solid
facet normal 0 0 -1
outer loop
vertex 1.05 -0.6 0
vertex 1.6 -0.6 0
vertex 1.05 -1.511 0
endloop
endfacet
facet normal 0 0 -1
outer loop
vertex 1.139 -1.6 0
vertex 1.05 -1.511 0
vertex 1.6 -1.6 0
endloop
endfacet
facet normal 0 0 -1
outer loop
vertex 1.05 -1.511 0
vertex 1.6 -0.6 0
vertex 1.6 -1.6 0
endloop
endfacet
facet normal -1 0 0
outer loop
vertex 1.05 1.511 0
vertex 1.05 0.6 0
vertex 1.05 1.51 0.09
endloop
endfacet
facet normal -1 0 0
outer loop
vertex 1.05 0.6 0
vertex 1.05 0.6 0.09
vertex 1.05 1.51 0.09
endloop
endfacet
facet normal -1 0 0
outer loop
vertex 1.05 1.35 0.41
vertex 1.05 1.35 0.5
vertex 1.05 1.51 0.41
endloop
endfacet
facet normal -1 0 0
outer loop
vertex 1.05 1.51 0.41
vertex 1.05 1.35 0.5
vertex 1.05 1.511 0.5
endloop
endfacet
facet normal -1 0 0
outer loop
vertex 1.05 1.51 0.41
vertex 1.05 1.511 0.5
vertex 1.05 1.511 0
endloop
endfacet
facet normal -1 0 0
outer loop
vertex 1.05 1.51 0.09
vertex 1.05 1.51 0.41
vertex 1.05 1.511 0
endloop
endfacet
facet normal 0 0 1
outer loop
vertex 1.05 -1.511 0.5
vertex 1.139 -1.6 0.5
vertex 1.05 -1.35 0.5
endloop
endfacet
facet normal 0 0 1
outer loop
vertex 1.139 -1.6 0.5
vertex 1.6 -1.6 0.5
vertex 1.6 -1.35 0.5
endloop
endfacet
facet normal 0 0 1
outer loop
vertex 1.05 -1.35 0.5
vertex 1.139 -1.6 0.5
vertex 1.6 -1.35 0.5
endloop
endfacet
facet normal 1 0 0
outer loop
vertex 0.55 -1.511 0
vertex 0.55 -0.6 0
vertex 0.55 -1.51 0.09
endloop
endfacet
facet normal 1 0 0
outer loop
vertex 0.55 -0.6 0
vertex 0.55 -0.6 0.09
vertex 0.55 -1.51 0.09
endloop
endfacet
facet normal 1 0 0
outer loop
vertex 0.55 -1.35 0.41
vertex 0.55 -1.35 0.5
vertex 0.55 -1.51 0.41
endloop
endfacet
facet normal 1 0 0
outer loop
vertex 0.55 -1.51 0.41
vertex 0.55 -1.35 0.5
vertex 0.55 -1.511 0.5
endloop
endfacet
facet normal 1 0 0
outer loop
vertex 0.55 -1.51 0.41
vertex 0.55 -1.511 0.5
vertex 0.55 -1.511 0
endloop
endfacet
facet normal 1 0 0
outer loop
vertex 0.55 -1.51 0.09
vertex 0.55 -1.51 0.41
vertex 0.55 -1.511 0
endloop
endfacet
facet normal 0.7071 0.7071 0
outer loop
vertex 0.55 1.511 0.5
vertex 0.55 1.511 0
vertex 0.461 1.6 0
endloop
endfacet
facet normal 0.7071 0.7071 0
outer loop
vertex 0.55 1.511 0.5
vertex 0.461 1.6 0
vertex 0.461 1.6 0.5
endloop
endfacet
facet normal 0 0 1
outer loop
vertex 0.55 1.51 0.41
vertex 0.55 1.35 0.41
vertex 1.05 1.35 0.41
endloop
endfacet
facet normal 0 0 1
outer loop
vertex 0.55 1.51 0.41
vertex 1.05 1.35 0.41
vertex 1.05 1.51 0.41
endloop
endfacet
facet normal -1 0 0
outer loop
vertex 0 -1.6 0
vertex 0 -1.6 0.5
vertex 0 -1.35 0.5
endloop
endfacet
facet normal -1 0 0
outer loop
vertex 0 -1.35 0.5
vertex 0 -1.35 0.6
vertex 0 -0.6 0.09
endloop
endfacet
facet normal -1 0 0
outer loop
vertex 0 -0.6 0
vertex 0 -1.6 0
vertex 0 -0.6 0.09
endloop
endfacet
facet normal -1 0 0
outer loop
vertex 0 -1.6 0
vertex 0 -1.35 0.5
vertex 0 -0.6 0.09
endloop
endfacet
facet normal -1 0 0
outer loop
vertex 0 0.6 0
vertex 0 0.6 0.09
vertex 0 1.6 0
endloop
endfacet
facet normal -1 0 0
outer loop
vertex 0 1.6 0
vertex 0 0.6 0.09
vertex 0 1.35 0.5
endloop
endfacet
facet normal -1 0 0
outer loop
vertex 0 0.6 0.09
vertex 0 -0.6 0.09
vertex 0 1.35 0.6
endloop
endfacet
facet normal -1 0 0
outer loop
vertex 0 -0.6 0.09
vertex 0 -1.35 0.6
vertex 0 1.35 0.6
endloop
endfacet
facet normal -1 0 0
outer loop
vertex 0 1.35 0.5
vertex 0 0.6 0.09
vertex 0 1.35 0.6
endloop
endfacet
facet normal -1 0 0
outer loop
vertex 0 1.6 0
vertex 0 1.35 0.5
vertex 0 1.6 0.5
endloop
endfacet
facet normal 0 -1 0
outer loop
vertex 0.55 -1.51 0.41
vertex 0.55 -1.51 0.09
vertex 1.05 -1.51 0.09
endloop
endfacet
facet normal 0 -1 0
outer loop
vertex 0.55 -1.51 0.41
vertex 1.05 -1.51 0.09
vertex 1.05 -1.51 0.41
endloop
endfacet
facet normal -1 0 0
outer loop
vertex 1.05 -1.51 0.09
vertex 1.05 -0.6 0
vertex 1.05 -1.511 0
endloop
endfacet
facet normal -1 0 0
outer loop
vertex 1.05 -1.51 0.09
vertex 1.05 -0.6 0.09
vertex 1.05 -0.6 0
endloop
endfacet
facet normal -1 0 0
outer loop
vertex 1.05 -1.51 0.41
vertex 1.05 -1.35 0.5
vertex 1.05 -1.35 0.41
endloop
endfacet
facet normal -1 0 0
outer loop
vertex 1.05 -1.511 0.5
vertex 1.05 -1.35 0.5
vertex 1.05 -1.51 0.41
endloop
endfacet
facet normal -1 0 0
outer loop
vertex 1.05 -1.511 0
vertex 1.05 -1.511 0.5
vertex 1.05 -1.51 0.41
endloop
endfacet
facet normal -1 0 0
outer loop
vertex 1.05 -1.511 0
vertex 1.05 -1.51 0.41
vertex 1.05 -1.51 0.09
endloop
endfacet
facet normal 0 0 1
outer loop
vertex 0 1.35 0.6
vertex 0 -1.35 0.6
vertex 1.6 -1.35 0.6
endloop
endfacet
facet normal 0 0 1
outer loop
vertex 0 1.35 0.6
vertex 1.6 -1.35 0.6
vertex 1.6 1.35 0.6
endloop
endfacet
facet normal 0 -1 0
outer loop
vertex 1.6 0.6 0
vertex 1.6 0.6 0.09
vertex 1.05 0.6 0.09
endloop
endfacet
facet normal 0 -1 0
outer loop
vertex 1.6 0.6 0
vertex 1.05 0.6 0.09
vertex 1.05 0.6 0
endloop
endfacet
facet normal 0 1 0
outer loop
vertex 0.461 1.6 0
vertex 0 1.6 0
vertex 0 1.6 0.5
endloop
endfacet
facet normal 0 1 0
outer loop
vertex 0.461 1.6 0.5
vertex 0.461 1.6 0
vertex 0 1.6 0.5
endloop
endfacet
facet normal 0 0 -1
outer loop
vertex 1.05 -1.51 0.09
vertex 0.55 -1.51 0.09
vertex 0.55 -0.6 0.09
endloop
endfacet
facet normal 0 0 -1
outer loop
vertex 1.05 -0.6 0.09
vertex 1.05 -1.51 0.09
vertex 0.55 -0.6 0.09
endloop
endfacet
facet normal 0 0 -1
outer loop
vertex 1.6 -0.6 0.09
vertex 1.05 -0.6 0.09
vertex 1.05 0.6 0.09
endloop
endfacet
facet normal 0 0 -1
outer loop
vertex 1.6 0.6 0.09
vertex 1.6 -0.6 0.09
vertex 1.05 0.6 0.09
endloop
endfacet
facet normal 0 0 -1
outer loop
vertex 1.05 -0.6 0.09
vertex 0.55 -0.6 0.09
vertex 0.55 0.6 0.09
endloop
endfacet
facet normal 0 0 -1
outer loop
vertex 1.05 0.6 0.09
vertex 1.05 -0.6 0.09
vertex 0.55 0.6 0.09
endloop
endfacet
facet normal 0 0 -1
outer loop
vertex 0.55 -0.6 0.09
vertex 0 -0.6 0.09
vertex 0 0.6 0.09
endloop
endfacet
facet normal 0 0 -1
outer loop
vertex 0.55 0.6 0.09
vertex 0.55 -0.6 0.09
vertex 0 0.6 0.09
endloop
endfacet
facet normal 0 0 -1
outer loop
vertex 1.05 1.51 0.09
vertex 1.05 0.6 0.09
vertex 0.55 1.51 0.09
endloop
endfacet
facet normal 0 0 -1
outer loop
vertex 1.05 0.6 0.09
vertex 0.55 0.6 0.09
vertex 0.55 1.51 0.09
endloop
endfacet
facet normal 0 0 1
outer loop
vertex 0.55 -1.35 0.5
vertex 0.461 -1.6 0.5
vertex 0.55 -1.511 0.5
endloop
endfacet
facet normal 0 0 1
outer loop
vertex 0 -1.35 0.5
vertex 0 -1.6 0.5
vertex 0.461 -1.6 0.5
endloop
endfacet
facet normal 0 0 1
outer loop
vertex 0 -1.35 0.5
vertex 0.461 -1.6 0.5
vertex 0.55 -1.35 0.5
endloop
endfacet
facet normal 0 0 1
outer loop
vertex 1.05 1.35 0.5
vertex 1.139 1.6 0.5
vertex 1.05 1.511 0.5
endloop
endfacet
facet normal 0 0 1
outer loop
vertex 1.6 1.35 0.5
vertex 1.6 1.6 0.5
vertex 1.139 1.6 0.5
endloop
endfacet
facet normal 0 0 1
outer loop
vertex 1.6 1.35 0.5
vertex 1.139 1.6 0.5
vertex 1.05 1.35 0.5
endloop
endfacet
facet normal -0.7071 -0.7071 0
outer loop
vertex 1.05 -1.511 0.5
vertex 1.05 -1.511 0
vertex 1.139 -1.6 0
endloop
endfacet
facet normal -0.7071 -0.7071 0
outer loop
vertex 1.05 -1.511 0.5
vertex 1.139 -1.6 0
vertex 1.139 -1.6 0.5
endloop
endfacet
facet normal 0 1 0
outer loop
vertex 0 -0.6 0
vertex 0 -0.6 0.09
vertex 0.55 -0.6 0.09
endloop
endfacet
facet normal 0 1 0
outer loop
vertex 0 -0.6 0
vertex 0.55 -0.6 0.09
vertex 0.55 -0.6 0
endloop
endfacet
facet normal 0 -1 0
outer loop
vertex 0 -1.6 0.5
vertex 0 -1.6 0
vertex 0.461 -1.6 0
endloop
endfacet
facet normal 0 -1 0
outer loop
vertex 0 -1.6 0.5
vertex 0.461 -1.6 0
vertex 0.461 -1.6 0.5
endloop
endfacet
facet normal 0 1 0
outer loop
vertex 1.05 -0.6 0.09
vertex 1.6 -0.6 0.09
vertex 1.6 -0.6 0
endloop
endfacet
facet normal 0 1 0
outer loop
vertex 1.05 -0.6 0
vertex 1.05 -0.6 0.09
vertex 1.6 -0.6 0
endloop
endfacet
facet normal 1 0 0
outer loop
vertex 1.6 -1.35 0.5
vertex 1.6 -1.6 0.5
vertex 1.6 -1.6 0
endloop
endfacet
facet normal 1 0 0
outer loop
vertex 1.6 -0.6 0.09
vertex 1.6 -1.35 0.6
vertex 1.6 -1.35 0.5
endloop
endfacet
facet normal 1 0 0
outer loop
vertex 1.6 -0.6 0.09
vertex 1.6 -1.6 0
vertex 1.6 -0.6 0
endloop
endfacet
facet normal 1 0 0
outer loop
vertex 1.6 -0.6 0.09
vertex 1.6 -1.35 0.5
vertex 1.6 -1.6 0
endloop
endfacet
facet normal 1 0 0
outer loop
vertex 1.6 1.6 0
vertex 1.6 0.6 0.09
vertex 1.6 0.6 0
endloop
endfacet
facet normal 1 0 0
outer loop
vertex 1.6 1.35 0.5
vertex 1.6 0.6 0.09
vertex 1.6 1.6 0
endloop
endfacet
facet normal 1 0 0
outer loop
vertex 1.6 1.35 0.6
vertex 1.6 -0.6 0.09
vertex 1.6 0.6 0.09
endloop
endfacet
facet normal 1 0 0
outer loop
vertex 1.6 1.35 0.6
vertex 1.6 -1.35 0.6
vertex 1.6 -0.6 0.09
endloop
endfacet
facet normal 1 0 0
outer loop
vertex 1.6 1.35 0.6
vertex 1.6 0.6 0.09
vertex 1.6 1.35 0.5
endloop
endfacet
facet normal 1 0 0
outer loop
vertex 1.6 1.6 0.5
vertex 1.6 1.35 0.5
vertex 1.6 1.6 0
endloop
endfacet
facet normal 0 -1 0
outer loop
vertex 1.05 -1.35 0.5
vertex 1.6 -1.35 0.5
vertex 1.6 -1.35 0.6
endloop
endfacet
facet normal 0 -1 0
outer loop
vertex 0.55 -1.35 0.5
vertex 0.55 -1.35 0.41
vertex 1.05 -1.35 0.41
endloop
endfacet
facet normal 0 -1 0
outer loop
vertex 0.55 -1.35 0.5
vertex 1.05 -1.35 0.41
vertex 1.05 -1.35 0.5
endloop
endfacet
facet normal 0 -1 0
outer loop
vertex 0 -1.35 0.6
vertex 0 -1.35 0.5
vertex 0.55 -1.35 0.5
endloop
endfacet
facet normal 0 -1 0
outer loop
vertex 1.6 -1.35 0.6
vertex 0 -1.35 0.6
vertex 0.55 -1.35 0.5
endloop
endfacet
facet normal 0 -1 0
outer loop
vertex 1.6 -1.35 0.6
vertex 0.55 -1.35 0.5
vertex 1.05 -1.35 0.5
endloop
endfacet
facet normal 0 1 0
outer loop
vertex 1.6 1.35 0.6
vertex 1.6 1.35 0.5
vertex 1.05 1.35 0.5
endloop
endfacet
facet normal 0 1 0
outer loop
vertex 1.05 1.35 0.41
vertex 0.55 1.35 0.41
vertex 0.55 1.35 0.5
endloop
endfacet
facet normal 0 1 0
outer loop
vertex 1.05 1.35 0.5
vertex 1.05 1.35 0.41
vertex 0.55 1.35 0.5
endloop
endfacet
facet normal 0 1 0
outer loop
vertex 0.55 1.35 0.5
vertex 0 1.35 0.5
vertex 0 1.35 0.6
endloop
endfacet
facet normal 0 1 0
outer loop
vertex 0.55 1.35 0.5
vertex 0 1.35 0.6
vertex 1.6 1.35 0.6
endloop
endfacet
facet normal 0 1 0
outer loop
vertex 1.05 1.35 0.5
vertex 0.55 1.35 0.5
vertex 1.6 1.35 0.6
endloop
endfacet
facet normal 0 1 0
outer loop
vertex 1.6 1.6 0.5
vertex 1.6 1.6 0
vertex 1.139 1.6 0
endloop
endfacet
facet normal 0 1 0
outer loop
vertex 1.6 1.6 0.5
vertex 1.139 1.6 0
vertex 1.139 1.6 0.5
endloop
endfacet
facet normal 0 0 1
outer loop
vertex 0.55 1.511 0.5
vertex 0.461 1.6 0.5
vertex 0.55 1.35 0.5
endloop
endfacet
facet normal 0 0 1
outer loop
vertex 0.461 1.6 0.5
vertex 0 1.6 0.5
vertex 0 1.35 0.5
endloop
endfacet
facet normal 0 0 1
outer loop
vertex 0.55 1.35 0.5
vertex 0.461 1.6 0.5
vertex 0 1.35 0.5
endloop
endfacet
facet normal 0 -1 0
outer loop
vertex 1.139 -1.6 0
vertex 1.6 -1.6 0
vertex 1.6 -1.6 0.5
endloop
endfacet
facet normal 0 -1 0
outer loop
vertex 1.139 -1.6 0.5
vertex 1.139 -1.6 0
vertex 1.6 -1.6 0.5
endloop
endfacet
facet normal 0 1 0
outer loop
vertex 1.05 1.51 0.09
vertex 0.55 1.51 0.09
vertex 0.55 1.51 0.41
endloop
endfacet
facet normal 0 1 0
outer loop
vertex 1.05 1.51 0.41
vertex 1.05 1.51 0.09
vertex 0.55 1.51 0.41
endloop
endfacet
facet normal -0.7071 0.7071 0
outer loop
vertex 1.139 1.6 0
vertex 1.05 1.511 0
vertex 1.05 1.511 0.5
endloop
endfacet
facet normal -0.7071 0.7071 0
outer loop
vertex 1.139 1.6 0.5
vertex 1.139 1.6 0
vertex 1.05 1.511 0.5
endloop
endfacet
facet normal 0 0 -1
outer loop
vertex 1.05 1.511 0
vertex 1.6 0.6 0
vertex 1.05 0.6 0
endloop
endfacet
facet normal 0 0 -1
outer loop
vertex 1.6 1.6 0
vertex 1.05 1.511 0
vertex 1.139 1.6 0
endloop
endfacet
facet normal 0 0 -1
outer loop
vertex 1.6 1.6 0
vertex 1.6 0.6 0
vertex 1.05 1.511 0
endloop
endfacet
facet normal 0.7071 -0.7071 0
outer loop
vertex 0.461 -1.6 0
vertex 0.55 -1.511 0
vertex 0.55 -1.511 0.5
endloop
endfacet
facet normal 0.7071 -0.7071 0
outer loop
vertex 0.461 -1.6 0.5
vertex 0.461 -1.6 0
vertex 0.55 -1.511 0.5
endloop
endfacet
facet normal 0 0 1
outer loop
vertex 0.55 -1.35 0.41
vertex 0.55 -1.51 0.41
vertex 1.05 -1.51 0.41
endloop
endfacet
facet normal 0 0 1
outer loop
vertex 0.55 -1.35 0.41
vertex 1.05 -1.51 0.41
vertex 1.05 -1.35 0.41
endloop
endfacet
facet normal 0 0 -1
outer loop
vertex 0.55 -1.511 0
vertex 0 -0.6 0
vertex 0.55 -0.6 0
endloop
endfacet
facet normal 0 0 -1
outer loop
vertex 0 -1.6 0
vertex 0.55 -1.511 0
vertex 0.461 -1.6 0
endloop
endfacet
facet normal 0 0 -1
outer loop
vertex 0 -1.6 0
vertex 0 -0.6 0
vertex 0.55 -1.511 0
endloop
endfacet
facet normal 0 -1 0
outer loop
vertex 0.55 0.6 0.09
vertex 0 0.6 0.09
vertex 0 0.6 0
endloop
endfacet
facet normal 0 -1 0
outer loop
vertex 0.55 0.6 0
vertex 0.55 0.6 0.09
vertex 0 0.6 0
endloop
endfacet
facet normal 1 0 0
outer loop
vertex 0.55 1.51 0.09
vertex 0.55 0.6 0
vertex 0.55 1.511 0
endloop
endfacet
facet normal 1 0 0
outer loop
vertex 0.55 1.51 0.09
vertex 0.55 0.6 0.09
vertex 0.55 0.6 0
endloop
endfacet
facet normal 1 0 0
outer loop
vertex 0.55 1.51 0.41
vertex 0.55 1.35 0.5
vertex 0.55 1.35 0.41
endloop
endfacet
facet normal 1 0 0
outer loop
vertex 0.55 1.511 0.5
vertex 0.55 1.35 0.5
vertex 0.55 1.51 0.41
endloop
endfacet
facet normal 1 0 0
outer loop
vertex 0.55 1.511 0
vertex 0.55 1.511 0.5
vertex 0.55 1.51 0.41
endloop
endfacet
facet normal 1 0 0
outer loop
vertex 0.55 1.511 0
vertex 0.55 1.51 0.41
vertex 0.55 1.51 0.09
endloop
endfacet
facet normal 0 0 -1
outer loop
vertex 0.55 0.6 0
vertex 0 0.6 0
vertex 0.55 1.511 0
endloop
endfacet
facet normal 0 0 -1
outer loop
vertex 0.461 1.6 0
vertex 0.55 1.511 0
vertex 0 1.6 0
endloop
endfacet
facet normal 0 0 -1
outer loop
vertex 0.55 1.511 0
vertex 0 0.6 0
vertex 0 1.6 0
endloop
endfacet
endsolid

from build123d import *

# Parameters (mm, degrees)
SKETCH001_W  = 2.7
SKETCH001_H  = 0.19
PAD001_DEPTH = 1.6
SKETCH_W     = 3.02
SKETCH_H     = 0.32
PAD_DEPTH    = 1.6
PAD002_DEPTH = 0.55
CHAMFER_SIZE = 0.089


with BuildPart() as body001:
    # Sketch001 → Pad001 (new body)
    with BuildSketch(Plane.YZ):
        with Locations((0, 0.505)):
            Rectangle(SKETCH001_W, SKETCH001_H)
    extrude(amount=PAD001_DEPTH)


with BuildPart() as fusion002:
    # Sketch → Pad (new body)
    with BuildSketch(Plane.YZ):
        with Locations((0, 0.25)):
            Rectangle(SKETCH_W, SKETCH_H)
    extrude(amount=PAD_DEPTH)

    # Fusion002: union Body001
    add(body001.part)


with BuildPart() as body002:
    # Sketch002 → Pad002 (new body)
    with BuildSketch(Plane.YZ):
        Polygon((-1.35, 0.41), (-1.51, 0.41), (-1.51, 0.09), (-0.6, 0.09), (-0.6, 0), (-1.6, 0), (-1.6, 0.5), (-1.35, 0.5), align=None)
    extrude(amount=PAD002_DEPTH)

    # Chamfer
    chamfer_edges = [body002.edges().sort_by_distance(p)[0] for p in [
        (0.55, -1.6, 0.25),
    ]]
    chamfer(chamfer_edges, length=CHAMFER_SIZE)


with BuildPart() as mirror_of_body002:
    # mirror: instance of Body002
    add(body002.part.mirror(Plane(origin=(0.8, -1.325, 0.25), x_dir=(0, -1, 0), z_dir=(1, 0, 0))))


with BuildPart() as fusion:
    # Fusion base: copy of Body002
    add(body002.part)

    # Fusion: union Mirror of Body002
    add(mirror_of_body002.part)


with BuildPart() as mirror_of_fusion:
    # mirror001: instance of Fusion
    add(fusion.part.mirror(Plane(origin=(-1.31, 0, 0), x_dir=(1, 0, 0), z_dir=(0, 1, 0))))


with BuildPart() as lvk12:
    # Fusion001 base: copy of Fusion
    add(fusion.part)

    # Fusion001: union Mirror of Fusion
    add(mirror_of_fusion.part)

    # Fusion003: union Fusion002
    add(fusion002.part)


solid = lvk12.part
